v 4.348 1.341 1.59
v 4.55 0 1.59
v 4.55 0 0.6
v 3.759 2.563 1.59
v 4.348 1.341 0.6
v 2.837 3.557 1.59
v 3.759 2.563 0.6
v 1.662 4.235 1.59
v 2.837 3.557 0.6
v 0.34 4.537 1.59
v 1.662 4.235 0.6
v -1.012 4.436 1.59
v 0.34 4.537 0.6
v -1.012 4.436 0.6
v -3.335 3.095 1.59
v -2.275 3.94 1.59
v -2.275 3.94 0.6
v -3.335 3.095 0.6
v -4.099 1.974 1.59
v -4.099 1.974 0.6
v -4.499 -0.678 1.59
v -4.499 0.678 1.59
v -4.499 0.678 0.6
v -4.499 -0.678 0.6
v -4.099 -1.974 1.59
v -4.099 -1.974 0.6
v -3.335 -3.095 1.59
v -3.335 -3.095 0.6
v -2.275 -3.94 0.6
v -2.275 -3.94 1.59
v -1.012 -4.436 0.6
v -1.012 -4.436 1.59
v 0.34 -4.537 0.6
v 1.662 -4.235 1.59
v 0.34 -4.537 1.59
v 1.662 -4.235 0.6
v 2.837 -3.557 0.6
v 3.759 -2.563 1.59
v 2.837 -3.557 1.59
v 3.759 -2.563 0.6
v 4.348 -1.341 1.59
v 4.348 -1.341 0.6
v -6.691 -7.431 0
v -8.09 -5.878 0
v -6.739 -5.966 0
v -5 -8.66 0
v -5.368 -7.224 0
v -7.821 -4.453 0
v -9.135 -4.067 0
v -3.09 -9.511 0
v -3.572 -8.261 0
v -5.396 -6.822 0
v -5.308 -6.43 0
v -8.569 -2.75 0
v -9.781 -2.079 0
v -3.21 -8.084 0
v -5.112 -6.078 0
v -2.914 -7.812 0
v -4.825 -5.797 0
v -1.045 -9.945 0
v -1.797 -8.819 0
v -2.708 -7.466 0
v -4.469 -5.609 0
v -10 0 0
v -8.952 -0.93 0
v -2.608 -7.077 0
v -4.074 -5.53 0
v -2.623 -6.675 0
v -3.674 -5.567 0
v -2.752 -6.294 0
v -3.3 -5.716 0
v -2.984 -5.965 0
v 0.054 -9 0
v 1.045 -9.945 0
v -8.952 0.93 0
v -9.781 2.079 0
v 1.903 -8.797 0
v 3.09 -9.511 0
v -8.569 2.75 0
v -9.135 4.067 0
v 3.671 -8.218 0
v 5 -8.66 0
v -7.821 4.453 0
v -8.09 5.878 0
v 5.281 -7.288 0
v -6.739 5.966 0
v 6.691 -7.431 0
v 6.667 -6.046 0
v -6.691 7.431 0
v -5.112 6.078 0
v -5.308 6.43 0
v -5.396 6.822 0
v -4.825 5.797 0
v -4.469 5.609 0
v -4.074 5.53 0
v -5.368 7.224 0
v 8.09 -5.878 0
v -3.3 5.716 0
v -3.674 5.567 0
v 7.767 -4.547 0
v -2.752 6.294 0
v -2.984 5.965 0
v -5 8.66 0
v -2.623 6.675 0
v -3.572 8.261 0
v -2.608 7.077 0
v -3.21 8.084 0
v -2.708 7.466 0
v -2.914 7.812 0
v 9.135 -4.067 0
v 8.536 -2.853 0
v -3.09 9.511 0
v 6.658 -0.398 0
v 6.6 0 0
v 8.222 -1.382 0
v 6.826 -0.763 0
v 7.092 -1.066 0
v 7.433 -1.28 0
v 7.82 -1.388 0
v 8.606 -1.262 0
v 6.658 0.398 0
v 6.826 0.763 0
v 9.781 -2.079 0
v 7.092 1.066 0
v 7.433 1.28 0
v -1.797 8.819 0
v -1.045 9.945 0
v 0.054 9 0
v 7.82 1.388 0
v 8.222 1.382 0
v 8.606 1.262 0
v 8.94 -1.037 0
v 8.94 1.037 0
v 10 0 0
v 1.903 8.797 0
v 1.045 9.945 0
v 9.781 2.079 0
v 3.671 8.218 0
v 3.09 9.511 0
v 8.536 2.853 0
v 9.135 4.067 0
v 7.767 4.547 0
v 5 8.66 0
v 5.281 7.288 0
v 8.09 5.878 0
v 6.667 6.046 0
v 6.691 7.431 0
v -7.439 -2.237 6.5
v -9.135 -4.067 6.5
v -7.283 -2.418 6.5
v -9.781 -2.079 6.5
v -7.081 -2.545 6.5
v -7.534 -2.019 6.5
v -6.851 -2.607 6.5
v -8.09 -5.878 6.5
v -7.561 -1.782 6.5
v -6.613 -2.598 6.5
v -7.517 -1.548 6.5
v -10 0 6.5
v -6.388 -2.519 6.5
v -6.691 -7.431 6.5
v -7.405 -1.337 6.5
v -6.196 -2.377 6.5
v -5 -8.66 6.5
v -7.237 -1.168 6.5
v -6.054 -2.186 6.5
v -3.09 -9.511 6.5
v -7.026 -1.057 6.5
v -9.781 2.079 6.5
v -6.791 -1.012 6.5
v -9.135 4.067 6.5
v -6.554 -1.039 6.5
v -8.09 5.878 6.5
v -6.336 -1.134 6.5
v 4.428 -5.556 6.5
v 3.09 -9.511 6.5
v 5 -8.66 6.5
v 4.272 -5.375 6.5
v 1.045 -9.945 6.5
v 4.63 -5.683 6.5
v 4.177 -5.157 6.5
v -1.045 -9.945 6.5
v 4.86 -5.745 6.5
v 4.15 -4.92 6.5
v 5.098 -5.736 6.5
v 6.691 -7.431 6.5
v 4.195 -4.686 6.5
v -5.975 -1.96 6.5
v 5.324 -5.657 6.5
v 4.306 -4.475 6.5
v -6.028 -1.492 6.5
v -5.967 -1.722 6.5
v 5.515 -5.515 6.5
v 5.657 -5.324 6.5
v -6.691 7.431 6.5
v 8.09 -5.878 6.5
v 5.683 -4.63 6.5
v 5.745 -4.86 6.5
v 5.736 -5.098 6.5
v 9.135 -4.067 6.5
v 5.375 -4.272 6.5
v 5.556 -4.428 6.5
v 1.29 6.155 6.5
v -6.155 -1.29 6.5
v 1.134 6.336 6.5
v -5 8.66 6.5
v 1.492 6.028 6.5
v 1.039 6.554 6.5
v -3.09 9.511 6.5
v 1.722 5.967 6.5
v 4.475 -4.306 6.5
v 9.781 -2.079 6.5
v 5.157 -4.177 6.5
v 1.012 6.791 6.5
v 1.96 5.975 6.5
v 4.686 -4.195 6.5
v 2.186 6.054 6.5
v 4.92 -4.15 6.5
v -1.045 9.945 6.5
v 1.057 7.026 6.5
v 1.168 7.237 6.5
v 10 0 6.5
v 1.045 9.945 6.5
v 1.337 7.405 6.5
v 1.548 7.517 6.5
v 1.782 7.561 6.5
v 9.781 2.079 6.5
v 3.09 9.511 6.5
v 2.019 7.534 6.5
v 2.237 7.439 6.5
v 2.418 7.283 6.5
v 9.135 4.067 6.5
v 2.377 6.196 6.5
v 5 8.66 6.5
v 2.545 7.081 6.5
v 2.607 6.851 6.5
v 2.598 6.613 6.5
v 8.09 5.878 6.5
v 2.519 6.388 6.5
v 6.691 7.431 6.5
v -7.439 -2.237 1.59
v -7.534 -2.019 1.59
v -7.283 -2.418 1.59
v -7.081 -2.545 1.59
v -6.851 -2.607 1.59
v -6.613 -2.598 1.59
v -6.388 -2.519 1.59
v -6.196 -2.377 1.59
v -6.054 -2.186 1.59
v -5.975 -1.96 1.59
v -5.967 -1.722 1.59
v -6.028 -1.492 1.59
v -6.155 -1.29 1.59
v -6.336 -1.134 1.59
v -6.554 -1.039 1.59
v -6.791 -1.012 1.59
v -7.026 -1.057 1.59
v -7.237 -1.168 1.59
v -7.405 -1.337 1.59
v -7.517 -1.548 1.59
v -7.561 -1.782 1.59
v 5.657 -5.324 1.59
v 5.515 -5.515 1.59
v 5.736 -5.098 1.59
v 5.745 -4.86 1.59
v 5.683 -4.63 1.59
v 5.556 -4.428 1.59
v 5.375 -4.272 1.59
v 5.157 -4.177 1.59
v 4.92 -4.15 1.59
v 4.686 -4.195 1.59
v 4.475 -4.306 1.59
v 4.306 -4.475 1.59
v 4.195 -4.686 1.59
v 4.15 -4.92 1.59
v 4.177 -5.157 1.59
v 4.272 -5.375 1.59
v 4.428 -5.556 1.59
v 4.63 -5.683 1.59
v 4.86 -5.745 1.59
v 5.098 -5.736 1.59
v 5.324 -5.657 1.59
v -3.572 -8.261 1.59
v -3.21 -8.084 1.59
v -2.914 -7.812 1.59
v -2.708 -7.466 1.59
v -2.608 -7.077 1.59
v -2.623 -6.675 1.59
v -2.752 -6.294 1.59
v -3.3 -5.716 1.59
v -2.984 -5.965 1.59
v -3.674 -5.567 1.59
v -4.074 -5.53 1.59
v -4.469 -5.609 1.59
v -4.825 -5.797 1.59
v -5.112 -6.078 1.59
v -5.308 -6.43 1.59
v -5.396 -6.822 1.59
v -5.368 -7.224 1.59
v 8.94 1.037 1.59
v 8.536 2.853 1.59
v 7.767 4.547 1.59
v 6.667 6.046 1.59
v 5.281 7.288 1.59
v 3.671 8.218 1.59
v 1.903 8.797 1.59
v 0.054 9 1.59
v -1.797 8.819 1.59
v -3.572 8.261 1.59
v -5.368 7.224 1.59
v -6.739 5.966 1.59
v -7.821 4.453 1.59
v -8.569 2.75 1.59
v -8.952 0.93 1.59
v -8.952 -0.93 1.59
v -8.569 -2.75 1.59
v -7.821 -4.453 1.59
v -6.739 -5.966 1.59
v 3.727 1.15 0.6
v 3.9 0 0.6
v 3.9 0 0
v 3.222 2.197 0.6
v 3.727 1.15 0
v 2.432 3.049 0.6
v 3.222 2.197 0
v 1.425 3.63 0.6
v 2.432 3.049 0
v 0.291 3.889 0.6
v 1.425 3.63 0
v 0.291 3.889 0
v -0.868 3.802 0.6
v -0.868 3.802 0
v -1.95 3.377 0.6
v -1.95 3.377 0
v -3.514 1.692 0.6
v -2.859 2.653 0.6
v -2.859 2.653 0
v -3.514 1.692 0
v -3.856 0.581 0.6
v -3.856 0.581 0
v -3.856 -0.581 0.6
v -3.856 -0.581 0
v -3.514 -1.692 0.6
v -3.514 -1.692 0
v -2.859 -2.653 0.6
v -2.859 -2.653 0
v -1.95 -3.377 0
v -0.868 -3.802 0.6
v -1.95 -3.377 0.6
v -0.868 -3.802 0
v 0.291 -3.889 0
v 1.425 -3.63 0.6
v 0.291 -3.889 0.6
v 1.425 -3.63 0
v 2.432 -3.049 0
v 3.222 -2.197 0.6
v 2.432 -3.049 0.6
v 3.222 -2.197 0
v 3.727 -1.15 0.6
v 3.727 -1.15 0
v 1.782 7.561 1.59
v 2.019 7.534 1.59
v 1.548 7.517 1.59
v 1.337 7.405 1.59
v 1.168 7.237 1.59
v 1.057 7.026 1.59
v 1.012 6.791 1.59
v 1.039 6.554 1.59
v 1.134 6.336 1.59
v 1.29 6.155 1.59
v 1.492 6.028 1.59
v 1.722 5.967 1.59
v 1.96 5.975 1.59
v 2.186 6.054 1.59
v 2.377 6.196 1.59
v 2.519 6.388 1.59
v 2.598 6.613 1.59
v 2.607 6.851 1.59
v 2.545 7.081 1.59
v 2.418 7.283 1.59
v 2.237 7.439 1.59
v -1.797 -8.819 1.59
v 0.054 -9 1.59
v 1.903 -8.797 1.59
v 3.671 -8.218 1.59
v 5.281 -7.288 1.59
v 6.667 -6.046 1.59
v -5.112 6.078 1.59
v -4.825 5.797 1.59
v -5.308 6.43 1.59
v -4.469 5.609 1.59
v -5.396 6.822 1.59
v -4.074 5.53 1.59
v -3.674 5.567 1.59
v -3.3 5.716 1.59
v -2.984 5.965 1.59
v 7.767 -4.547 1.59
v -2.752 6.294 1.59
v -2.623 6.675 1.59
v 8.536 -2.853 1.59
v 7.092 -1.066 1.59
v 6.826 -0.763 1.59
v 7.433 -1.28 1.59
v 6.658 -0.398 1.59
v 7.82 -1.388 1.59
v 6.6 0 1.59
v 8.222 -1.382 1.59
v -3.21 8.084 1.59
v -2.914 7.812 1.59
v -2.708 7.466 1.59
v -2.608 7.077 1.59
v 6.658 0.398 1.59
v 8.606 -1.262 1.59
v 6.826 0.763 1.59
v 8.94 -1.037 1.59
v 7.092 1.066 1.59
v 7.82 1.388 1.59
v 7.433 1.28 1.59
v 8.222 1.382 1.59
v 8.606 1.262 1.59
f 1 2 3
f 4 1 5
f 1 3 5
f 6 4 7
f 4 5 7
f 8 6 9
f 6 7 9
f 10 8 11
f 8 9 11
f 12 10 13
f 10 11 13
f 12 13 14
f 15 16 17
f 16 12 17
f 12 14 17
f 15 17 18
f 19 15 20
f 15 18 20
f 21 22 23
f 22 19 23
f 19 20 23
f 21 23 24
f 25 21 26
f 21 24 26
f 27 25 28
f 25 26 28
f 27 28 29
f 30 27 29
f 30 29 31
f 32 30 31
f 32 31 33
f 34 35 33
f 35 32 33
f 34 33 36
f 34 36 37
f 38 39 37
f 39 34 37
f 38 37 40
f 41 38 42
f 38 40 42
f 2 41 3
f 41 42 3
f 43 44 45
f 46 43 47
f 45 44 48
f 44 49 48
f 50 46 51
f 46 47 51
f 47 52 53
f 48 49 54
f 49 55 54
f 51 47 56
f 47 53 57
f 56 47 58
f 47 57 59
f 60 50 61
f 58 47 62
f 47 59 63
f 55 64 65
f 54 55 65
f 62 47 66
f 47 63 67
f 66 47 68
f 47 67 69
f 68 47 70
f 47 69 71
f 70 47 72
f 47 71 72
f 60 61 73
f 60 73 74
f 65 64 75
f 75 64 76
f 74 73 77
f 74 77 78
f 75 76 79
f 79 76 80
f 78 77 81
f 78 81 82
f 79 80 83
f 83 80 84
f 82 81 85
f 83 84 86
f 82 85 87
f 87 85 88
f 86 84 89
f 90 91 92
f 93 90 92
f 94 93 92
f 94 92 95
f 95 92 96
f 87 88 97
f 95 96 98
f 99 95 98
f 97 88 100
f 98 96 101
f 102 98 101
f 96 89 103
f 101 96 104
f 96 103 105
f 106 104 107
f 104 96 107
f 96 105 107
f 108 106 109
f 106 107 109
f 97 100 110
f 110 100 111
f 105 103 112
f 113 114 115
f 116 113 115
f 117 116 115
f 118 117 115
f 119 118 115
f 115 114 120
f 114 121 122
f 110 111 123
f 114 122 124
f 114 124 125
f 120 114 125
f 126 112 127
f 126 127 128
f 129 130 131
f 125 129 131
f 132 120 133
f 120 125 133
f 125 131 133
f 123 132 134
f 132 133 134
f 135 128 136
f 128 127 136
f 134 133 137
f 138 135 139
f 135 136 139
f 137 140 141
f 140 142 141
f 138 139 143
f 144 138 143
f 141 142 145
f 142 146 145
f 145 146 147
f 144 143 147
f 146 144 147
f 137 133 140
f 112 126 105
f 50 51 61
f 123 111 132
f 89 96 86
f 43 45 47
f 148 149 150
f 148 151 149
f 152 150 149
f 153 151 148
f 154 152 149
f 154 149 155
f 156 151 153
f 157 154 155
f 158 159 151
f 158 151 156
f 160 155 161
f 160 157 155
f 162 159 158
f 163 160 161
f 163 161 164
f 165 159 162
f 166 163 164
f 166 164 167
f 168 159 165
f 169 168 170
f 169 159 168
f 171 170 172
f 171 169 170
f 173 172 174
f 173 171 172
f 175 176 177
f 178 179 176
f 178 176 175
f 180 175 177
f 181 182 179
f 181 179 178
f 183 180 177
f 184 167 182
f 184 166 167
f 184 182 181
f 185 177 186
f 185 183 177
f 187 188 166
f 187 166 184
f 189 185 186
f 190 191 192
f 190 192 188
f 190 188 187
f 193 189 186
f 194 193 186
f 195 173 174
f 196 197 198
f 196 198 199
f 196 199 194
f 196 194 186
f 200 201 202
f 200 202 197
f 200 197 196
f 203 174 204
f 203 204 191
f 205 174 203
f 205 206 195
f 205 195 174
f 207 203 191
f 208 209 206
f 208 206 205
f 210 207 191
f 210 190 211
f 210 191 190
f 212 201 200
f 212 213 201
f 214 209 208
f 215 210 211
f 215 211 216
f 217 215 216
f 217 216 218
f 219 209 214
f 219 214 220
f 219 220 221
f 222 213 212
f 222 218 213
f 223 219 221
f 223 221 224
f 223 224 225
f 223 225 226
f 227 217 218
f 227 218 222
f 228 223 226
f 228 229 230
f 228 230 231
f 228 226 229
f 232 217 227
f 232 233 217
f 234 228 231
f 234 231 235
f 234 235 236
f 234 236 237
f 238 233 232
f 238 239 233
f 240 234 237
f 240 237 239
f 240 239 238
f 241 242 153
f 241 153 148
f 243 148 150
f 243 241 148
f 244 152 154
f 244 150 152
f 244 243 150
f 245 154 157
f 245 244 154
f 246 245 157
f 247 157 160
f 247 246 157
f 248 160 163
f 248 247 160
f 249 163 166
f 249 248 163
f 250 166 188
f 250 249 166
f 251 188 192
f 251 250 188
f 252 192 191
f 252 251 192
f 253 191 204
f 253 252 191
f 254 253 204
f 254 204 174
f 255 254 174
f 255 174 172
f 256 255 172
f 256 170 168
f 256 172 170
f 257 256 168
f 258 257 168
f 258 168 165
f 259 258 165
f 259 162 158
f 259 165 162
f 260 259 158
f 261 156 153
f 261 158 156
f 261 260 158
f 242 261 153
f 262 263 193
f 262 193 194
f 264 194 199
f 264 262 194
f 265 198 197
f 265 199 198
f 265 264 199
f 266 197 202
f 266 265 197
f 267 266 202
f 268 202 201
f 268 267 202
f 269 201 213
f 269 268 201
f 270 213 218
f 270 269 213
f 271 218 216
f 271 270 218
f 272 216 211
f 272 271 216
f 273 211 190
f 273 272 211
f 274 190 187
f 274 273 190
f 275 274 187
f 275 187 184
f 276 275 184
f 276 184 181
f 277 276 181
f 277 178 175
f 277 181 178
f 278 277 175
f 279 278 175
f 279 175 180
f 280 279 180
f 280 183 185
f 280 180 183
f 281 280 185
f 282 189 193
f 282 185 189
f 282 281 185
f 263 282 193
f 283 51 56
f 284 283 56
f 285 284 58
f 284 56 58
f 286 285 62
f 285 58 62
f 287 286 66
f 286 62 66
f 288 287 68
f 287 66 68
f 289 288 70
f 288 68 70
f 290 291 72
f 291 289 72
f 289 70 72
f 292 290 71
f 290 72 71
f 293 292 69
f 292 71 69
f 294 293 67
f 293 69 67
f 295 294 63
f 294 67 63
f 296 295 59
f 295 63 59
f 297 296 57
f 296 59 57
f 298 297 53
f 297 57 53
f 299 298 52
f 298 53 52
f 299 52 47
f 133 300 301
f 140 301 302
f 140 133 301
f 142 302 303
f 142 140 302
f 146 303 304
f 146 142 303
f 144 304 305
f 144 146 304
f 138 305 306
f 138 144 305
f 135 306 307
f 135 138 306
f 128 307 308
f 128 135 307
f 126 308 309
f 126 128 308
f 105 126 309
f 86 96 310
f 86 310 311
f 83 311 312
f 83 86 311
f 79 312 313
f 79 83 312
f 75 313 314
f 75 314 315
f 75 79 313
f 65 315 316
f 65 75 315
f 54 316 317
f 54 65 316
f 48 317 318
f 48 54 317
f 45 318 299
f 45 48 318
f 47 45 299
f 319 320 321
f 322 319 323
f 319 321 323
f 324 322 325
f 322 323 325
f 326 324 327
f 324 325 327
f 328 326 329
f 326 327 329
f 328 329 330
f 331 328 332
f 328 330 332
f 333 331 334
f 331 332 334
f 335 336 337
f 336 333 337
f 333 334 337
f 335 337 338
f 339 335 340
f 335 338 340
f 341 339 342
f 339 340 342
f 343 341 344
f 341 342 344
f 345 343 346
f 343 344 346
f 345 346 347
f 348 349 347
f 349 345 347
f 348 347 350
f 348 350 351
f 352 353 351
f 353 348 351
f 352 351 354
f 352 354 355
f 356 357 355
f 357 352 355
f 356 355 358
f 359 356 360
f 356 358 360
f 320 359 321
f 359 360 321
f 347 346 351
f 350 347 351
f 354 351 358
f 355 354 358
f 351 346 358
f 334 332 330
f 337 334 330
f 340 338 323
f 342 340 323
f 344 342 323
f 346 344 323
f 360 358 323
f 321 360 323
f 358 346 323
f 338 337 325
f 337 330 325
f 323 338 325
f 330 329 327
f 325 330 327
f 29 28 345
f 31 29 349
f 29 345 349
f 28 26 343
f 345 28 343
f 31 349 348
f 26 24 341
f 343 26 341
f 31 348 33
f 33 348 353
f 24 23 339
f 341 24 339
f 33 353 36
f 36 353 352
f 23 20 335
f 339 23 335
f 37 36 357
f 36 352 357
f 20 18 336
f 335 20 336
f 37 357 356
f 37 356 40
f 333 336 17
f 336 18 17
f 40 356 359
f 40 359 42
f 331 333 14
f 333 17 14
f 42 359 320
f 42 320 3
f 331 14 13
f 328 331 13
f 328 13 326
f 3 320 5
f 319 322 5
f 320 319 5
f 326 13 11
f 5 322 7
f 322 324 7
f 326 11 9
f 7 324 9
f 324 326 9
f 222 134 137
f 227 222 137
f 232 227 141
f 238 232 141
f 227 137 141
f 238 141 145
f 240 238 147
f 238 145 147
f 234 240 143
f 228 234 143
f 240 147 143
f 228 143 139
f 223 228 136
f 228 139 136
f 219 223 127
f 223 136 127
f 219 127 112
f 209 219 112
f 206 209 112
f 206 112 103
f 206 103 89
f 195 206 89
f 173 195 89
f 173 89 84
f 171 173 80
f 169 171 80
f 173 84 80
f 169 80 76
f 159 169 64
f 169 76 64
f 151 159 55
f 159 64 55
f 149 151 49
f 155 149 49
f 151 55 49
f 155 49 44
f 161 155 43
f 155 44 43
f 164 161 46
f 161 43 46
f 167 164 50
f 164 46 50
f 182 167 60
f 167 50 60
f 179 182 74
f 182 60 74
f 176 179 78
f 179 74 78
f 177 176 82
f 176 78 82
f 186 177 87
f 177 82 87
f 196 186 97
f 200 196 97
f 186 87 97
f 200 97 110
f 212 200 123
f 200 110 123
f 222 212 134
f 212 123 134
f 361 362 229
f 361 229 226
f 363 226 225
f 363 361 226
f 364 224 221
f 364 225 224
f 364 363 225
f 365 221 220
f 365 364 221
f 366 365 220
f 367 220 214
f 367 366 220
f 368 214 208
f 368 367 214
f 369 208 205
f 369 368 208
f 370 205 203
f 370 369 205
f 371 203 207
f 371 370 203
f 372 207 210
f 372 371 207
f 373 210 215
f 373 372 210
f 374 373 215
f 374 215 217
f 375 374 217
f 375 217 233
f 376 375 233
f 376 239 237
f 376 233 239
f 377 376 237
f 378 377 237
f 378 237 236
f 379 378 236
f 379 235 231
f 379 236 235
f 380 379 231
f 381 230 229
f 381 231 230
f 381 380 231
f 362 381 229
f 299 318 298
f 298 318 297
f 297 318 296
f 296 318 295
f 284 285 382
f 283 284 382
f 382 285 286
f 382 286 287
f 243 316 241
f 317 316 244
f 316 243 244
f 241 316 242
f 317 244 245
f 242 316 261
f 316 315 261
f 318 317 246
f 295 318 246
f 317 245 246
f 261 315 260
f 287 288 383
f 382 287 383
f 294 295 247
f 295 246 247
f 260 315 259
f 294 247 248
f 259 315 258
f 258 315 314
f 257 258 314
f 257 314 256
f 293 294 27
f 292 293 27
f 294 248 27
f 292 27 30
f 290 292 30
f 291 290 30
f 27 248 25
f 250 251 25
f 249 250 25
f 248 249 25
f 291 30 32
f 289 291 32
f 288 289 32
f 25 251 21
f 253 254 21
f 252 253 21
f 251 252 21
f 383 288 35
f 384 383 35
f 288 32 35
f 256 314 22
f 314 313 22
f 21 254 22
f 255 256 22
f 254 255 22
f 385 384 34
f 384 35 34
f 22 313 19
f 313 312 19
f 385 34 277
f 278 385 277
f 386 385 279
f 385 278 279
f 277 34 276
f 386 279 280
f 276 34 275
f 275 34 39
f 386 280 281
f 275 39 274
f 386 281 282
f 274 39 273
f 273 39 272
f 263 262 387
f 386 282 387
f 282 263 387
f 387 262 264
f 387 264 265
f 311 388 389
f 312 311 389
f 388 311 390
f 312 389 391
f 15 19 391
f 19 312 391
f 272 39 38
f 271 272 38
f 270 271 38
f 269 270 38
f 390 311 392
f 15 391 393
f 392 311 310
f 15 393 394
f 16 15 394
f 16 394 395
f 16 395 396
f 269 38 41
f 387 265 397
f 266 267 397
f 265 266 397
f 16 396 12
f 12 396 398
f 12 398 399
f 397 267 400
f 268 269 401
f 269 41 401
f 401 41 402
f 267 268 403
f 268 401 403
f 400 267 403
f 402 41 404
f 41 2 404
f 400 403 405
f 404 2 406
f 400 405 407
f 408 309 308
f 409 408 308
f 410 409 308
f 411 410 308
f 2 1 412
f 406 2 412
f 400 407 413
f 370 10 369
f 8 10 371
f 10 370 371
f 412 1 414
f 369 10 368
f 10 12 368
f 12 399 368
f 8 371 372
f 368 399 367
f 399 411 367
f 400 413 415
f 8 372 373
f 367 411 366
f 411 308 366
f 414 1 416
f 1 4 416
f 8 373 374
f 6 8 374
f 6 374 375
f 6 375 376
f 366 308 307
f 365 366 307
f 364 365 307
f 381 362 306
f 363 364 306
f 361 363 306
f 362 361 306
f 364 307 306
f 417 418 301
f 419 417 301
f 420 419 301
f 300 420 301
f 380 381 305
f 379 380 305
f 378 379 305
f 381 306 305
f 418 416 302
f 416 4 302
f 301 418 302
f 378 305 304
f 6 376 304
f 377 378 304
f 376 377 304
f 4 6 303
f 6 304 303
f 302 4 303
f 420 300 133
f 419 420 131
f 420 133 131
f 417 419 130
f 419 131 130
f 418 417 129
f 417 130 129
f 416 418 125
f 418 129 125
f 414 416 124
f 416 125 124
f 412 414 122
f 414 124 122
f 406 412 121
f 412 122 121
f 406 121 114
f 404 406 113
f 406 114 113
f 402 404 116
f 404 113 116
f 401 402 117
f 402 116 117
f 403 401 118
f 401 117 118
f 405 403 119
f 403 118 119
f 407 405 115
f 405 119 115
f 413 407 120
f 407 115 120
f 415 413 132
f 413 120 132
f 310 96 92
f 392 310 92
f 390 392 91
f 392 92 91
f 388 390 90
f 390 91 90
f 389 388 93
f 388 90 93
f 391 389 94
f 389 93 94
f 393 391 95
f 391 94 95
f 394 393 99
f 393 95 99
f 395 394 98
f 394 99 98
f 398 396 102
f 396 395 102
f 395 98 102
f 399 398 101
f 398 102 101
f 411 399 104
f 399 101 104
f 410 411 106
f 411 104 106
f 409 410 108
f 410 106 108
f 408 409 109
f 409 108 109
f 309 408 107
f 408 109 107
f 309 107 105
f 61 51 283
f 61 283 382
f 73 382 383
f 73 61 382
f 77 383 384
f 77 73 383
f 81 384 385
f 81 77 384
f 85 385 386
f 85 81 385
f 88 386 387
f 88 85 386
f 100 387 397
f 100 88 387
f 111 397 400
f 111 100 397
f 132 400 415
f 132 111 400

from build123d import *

# Parameters (mm, degrees)
CYLINDER044_R            = 0.8
CYLINDER044_DEPTH        = 10
ARRAY007_COUNT           = 3
ARRAY007_PLACEMENT_ANGLE = 45
CYLINDER027_R            = 4.55
CYLINDER027_DEPTH        = 10
CYLINDER026_R            = 3.9
CYLINDER026_DEPTH        = 10
CYLINDER024_R            = 1.4
CYLINDER024_DEPTH        = 10
ARRAY_COUNT              = 3
CYLINDER023_R            = 9
CYLINDER023_DEPTH        = 1.59
CYLINDER043_R            = 10
CYLINDER043_DEPTH        = 6.5


with BuildPart() as array007:
    # Cylinder044 → Cylinder044 (new body)
    with BuildSketch(Plane(origin=(7, 0, 0), x_dir=(1, 0, 0), z_dir=(0, 0, 1))):
        Circle(CYLINDER044_R)
    extrude(amount=CYLINDER044_DEPTH)

    # Array007: Array007 ×3 about axis
    array007_axis = Axis((0, 0, 0), (0, 0, 1))


with BuildPart() as array007_1:
    add(array007.part)
    for i in range(1, ARRAY007_COUNT):
        add(array007.part.rotate(array007_axis, i * 360 / ARRAY007_COUNT))


with BuildPart() as array007_2:
    # Array007 placement: moved
    add(array007_1.part.rotate(Axis((0, 0, 0), (0, 0, -1)), ARRAY007_PLACEMENT_ANGLE))


with BuildPart() as mountplatelip:
    # Cylinder027 → Cylinder027 (new body)
    with BuildSketch(Plane.XY.offset(0.6)):
        Circle(CYLINDER027_R)
    extrude(amount=CYLINDER027_DEPTH)


with BuildPart() as mountplateinnerhole:
    # Cylinder026 → Cylinder026 (new body)
    with BuildSketch(Plane.XY):
        Circle(CYLINDER026_R)
    extrude(amount=CYLINDER026_DEPTH)


with BuildPart() as fusion012:
    # Cylinder024 → Cylinder024 (new body)
    with BuildSketch(Plane(origin=(8, 0, 0), x_dir=(1, 0, 0), z_dir=(0, 0, 1))):
        Circle(CYLINDER024_R)
    extrude(amount=CYLINDER024_DEPTH)

    # Array: Fusion012 ×3 about axis
    array_axis = Axis((0, 0, 0), (0, 0, 1))


with BuildPart() as fusion012_1:
    add(fusion012.part)
    for i in range(1, ARRAY_COUNT):
        add(fusion012.part.rotate(array_axis, i * 360 / ARRAY_COUNT))

    # Fusion012: union MountPlateLip, MountPlateInnerHole
    add(mountplatelip.part)
    add(mountplateinnerhole.part)


with BuildPart() as cut013:
    # Cylinder023 → Cylinder023 (new body)
    with BuildSketch(Plane.XY):
        Circle(CYLINDER023_R)
    extrude(amount=CYLINDER023_DEPTH)

    # Cut013: cut Fusion012
    add(fusion012_1.part, mode=Mode.SUBTRACT)


with BuildPart() as cut015:
    # Cylinder043 → Cylinder043 (new body)
    with BuildSketch(Plane.XY):
        Circle(CYLINDER043_R)
    extrude(amount=CYLINDER043_DEPTH)

    # Cut014: cut Cut013
    add(cut013.part, mode=Mode.SUBTRACT)

    # Cut015: cut Array007
    add(array007_2.part, mode=Mode.SUBTRACT)


solid = cut015.part
